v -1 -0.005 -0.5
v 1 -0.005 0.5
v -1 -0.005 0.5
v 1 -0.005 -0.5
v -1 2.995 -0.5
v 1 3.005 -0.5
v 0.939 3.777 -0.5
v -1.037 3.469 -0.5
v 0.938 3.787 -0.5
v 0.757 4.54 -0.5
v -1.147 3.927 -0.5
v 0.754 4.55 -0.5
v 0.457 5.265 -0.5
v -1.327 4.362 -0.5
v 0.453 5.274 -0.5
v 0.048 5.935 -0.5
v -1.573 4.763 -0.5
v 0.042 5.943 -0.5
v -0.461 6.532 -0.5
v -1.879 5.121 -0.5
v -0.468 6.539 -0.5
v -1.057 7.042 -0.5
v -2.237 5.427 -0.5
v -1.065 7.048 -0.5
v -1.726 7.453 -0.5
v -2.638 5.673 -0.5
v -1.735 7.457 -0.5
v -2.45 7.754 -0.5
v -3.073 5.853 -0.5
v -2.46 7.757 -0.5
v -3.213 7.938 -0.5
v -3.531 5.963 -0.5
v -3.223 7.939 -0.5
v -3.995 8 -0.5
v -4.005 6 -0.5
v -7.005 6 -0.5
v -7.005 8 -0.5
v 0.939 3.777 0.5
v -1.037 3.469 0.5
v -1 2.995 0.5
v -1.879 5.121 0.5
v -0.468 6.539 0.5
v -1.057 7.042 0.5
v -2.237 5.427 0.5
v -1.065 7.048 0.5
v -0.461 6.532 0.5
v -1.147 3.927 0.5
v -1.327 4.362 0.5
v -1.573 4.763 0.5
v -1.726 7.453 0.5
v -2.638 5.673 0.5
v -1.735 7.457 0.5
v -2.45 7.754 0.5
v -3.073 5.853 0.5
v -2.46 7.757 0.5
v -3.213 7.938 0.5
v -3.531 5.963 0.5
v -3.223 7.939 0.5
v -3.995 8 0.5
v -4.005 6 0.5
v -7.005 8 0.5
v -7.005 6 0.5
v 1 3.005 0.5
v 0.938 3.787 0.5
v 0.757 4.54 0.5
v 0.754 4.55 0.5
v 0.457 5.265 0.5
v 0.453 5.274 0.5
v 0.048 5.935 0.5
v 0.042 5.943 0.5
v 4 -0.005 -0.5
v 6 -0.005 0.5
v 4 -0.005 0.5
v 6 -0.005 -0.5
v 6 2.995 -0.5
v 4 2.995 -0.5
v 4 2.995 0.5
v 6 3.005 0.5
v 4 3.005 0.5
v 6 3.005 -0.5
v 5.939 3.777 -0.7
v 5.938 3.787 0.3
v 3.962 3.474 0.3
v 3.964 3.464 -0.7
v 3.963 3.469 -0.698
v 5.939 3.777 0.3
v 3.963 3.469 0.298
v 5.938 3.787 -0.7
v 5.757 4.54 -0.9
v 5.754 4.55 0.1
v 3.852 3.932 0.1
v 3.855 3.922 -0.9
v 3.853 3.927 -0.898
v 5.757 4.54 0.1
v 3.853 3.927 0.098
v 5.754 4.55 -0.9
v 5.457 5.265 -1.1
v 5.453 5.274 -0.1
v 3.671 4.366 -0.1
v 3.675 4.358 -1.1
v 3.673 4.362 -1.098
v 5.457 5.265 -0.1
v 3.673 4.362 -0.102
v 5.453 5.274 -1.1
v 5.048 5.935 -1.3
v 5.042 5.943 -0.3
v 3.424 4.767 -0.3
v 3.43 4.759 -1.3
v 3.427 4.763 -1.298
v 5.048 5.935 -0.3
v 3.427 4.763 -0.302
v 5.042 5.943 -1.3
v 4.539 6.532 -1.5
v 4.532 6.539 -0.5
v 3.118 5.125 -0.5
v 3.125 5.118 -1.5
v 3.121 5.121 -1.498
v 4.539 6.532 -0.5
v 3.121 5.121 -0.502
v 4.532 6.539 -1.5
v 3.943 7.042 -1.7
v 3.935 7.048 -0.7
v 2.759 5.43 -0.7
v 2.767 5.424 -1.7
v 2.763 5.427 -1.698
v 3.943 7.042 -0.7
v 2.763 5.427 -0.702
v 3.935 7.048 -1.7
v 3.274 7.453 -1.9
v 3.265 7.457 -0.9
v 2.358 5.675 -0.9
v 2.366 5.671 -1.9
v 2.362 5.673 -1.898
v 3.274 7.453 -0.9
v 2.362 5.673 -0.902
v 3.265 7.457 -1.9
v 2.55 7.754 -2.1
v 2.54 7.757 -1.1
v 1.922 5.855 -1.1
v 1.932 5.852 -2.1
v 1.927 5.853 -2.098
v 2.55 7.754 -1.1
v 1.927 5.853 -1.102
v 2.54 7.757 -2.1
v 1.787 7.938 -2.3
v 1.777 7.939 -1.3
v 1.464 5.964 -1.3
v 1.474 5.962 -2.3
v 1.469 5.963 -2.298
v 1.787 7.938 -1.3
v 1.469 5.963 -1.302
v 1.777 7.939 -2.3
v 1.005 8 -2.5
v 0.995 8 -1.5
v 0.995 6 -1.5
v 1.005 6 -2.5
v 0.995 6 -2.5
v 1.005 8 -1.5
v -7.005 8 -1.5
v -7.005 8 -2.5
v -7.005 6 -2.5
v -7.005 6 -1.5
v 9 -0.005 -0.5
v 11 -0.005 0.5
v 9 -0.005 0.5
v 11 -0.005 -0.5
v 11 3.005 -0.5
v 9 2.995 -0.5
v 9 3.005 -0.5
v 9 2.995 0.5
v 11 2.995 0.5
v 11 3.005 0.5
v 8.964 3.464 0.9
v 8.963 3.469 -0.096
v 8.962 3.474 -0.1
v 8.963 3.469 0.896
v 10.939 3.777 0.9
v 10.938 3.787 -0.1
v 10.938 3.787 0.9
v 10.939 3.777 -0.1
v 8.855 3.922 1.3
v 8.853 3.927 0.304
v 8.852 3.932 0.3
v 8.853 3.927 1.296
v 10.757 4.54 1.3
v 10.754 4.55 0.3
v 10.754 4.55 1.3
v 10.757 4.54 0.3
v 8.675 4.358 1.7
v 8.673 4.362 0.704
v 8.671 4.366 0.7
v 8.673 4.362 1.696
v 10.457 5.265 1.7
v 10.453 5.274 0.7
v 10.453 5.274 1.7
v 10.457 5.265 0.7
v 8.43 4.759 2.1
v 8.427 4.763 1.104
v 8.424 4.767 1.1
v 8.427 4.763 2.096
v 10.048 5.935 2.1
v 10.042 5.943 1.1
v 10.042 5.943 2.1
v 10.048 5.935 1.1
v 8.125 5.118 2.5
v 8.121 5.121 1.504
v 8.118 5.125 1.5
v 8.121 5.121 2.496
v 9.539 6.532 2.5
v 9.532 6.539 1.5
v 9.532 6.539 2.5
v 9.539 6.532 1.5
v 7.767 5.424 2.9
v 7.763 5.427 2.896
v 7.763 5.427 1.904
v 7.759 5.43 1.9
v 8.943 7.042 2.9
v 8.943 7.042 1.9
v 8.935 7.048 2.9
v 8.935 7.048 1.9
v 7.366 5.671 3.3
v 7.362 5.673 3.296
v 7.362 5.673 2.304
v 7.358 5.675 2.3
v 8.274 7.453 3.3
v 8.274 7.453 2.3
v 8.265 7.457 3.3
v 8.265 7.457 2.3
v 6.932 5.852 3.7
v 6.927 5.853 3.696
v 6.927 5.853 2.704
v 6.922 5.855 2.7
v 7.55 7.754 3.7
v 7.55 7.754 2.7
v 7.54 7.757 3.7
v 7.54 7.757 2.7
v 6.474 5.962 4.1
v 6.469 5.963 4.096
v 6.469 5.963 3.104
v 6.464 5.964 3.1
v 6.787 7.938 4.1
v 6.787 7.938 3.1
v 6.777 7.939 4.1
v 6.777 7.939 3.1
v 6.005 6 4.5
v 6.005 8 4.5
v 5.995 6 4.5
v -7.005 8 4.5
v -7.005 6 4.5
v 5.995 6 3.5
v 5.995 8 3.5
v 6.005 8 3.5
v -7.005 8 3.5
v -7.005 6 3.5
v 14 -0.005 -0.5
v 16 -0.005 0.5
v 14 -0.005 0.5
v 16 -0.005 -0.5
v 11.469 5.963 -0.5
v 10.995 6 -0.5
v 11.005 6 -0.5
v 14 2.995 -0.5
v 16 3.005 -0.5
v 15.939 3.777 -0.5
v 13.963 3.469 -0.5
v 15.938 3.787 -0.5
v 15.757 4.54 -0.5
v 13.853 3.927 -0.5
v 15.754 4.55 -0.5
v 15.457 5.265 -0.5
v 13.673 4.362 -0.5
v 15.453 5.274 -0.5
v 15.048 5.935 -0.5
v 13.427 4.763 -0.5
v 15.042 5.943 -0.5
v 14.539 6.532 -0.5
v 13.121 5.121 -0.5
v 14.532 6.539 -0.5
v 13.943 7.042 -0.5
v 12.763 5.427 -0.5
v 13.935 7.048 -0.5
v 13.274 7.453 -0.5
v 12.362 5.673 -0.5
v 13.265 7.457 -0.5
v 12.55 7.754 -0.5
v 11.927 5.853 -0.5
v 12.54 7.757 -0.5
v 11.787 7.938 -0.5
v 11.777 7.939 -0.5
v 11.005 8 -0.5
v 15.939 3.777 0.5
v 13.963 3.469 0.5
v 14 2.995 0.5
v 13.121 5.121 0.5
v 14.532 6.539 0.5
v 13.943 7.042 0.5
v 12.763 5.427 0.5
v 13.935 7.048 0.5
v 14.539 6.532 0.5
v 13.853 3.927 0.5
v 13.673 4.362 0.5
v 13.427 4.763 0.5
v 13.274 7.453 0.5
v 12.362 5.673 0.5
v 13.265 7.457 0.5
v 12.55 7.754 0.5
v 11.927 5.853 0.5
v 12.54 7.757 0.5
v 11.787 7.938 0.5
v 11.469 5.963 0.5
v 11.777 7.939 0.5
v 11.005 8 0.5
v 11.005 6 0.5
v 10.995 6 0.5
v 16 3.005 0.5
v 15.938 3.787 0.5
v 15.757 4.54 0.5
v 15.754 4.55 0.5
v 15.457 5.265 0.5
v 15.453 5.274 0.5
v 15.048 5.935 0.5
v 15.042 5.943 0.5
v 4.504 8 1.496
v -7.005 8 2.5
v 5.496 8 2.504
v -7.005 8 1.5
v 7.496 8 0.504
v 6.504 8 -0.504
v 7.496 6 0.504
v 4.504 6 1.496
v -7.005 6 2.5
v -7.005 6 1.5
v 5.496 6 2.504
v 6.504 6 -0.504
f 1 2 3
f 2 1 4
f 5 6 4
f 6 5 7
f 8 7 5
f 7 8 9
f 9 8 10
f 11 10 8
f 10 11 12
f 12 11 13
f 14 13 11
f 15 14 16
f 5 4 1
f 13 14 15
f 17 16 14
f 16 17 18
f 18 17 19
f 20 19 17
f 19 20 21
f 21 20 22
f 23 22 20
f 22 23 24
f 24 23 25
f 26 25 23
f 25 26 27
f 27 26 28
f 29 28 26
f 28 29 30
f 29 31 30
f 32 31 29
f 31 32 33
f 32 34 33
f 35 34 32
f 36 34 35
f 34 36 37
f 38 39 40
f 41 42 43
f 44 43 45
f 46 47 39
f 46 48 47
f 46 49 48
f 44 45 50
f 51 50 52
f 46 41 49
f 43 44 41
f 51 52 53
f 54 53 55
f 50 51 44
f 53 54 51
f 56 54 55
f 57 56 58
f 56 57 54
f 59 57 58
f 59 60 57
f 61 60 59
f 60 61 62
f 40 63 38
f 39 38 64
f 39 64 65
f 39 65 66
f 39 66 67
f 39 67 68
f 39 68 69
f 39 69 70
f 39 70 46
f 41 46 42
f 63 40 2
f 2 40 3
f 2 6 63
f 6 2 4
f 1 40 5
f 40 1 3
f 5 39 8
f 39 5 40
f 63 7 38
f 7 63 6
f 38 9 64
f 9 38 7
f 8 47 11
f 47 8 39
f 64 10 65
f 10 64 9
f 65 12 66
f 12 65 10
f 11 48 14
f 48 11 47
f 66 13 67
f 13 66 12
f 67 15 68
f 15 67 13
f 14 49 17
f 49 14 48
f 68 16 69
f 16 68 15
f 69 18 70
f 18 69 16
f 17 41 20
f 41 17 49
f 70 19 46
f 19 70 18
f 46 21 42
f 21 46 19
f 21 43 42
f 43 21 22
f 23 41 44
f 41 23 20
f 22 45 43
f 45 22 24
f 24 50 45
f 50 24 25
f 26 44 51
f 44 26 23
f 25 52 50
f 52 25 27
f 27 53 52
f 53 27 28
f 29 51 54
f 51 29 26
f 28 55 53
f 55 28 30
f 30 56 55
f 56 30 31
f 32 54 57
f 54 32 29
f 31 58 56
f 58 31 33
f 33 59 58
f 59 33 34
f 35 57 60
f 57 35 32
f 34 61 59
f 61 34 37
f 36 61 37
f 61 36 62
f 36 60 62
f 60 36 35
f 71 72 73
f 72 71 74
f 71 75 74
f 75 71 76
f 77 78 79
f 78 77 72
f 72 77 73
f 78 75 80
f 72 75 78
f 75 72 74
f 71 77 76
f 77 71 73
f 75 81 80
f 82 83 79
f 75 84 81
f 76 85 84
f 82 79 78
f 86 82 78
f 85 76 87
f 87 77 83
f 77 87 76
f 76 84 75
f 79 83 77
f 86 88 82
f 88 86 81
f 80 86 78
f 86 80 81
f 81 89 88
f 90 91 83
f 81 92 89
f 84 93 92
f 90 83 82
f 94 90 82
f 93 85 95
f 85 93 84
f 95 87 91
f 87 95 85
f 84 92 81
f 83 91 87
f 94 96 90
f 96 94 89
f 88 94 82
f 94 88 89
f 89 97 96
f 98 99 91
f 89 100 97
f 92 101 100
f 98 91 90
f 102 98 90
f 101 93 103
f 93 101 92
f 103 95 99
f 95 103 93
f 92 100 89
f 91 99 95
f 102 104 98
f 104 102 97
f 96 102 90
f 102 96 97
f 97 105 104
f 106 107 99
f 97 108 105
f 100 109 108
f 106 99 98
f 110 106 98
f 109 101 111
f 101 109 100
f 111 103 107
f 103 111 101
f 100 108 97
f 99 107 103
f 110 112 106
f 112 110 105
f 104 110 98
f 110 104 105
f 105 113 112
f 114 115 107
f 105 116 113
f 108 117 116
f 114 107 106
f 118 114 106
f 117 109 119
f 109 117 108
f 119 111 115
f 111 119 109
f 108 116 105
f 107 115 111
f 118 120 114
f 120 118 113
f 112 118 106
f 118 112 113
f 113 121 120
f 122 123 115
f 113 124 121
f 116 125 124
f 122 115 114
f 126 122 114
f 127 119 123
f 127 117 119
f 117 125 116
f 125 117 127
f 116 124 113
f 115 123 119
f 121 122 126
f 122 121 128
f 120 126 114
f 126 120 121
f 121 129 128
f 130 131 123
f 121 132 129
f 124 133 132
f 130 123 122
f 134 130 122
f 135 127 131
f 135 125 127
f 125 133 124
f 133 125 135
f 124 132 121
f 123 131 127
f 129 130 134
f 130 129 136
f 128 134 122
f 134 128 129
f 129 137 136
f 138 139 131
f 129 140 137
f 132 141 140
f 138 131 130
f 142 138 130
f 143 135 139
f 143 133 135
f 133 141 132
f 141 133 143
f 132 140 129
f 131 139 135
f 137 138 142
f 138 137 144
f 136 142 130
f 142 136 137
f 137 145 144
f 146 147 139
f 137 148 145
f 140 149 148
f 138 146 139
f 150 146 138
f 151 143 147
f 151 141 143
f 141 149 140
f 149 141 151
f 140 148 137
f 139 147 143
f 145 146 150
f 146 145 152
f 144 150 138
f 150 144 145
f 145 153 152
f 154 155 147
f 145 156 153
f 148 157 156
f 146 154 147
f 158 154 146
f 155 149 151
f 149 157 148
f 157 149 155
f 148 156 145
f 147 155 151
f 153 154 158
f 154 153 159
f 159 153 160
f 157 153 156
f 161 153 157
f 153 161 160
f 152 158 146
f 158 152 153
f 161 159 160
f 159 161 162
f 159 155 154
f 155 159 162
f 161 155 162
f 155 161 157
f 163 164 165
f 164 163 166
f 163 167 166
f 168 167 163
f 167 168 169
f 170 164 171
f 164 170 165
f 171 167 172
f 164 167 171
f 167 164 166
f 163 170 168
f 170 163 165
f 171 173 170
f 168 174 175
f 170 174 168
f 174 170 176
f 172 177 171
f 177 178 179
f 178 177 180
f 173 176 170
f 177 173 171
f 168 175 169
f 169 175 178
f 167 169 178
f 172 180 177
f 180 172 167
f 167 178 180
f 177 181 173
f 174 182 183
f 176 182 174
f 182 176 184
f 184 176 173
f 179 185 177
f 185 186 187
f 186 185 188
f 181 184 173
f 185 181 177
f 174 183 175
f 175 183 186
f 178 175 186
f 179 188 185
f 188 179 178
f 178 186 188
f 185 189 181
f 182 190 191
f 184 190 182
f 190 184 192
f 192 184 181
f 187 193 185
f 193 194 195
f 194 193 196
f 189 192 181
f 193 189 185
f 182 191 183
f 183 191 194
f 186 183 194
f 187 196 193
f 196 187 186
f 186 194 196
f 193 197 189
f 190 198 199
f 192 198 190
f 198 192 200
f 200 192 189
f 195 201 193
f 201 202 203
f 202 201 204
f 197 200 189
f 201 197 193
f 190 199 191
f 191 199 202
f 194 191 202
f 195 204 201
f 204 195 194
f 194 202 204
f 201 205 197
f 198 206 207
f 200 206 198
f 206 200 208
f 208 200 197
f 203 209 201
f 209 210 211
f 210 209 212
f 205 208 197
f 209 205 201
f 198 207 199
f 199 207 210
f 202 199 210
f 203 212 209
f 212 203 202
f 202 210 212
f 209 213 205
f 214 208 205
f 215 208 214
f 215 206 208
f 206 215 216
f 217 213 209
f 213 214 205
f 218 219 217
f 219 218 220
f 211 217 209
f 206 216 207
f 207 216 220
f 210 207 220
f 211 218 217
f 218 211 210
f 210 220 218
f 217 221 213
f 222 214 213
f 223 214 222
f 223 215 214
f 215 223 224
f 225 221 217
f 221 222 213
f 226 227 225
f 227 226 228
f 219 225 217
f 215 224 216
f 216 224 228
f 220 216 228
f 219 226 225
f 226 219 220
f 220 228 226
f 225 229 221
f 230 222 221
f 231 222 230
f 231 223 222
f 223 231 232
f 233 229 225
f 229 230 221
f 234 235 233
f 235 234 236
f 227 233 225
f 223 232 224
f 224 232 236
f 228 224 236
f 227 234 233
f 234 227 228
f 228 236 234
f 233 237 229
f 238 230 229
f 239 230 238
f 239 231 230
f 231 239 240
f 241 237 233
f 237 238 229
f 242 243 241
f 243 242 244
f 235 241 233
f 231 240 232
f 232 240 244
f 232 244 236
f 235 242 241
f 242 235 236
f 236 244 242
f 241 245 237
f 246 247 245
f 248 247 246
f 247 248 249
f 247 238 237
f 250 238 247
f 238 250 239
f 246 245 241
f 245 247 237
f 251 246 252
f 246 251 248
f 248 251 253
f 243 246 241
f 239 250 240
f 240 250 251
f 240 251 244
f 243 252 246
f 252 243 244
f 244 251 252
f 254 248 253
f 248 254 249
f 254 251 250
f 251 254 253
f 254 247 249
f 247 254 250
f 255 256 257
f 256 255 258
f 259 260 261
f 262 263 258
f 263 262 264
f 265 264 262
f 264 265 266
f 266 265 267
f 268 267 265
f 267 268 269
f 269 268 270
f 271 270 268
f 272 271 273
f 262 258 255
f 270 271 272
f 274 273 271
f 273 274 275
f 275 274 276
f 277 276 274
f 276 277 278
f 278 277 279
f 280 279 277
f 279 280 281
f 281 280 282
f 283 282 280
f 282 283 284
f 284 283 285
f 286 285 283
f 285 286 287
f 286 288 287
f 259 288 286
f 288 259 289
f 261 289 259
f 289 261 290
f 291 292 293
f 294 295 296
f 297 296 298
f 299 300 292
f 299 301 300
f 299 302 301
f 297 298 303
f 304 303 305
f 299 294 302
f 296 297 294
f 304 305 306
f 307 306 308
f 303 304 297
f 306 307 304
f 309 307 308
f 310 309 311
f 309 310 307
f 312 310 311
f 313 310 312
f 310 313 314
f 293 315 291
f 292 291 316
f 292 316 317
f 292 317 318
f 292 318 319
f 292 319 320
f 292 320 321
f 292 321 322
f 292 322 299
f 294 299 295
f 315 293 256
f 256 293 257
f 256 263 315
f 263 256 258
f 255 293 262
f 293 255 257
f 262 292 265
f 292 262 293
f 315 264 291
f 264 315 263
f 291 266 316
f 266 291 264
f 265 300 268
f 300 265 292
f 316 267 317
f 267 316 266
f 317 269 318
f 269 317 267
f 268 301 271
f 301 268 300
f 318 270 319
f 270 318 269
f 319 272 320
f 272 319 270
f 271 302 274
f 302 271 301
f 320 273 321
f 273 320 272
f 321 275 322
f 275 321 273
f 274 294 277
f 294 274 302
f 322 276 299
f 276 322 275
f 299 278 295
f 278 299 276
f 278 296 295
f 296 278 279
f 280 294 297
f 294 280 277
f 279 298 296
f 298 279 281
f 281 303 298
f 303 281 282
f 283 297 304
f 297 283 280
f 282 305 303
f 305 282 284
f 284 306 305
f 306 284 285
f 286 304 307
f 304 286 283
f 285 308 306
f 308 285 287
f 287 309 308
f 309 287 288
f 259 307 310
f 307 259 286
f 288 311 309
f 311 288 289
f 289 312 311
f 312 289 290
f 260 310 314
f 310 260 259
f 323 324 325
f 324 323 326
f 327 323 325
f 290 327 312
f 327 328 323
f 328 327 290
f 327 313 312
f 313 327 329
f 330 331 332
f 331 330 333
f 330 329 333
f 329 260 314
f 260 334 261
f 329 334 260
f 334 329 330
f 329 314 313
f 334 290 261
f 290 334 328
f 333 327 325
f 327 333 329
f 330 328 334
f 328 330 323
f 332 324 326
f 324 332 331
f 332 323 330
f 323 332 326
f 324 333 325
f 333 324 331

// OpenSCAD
use <../polychannel.scad>

eps = 0.01;
base_arc_xy = arc_xy("cube", [2, eps, 1], radius=4, angle1=0, delta_angle=90, n=10);
chan1 = [
    ["cube", [2, eps, 1], [0, 0, 0], no_rot()],
    ["cube", [2, eps, 1], [0, 3, 0], no_rot()],
    each base_arc_xy,
    ["cube", [eps, 2, 1], [-3, 0, 0], no_rot()],
];
polychannel(chan1);
echo(get_final_position(chan1));

chan2 = [
    ["cube", [2, eps, 1], [0, 0, 0], no_rot()],
    ["cube", [2, eps, 1], [0, 3, 0], no_rot()],
    each uniformly_increase_rel_pos_in_z(base_arc_xy, -2),
    ["cube", [eps, 2, 1], [-8, 0, 0], no_rot()],
];
translate([5, 0, 0])
    polychannel(chan2);

chan3 = [
    ["cube", [2, eps, 1], [0, 0, 0], no_rot()],
    ["cube", [2, eps, 1], [0, 3, 0], no_rot()],
    each uniformly_increase_rel_pos_in_z(base_arc_xy, 4),
    ["cube", [eps, 2, 1], [-13, 0, 0], no_rot()],
];
translate([10, 0, 0])
    polychannel(chan3);

chan4 = [
    ["cube", [2, eps, 1], [0, 0, 0], no_rot()],
    ["cube", [2, eps, 1], [0, 3, 0], no_rot()],
    each base_arc_xy,
    ["cube", [eps, 2, 1*sqrt(2)], [-4, 0, 0], rot_y(45)],
    ["cube", [eps, 2, 1*sqrt(2)], [-2, 0, 2], rot_y(45)],
    ["cube", [eps, 2, 1], [-12, 0, 0], no_rot()],
];
translate([15, 0, 0])
    polychannel(chan4);


// Simple test channel to manually look at modified relative positions in the Console.
arc_test = [
    ["cube", [2, eps, 1], [0, 0, 0], no_rot()],
    ["cube", [2, eps, 1], [0, 3, 0], no_rot()],
    ["cube", [eps, 2, 1], [-3, 0, 0], no_rot()],
];
arc_test_mod = uniformly_increase_rel_pos(arc_test, [0, 0, 1]);
echo();
echo(arc_test);
echo(arc_test_mod);
echo();
